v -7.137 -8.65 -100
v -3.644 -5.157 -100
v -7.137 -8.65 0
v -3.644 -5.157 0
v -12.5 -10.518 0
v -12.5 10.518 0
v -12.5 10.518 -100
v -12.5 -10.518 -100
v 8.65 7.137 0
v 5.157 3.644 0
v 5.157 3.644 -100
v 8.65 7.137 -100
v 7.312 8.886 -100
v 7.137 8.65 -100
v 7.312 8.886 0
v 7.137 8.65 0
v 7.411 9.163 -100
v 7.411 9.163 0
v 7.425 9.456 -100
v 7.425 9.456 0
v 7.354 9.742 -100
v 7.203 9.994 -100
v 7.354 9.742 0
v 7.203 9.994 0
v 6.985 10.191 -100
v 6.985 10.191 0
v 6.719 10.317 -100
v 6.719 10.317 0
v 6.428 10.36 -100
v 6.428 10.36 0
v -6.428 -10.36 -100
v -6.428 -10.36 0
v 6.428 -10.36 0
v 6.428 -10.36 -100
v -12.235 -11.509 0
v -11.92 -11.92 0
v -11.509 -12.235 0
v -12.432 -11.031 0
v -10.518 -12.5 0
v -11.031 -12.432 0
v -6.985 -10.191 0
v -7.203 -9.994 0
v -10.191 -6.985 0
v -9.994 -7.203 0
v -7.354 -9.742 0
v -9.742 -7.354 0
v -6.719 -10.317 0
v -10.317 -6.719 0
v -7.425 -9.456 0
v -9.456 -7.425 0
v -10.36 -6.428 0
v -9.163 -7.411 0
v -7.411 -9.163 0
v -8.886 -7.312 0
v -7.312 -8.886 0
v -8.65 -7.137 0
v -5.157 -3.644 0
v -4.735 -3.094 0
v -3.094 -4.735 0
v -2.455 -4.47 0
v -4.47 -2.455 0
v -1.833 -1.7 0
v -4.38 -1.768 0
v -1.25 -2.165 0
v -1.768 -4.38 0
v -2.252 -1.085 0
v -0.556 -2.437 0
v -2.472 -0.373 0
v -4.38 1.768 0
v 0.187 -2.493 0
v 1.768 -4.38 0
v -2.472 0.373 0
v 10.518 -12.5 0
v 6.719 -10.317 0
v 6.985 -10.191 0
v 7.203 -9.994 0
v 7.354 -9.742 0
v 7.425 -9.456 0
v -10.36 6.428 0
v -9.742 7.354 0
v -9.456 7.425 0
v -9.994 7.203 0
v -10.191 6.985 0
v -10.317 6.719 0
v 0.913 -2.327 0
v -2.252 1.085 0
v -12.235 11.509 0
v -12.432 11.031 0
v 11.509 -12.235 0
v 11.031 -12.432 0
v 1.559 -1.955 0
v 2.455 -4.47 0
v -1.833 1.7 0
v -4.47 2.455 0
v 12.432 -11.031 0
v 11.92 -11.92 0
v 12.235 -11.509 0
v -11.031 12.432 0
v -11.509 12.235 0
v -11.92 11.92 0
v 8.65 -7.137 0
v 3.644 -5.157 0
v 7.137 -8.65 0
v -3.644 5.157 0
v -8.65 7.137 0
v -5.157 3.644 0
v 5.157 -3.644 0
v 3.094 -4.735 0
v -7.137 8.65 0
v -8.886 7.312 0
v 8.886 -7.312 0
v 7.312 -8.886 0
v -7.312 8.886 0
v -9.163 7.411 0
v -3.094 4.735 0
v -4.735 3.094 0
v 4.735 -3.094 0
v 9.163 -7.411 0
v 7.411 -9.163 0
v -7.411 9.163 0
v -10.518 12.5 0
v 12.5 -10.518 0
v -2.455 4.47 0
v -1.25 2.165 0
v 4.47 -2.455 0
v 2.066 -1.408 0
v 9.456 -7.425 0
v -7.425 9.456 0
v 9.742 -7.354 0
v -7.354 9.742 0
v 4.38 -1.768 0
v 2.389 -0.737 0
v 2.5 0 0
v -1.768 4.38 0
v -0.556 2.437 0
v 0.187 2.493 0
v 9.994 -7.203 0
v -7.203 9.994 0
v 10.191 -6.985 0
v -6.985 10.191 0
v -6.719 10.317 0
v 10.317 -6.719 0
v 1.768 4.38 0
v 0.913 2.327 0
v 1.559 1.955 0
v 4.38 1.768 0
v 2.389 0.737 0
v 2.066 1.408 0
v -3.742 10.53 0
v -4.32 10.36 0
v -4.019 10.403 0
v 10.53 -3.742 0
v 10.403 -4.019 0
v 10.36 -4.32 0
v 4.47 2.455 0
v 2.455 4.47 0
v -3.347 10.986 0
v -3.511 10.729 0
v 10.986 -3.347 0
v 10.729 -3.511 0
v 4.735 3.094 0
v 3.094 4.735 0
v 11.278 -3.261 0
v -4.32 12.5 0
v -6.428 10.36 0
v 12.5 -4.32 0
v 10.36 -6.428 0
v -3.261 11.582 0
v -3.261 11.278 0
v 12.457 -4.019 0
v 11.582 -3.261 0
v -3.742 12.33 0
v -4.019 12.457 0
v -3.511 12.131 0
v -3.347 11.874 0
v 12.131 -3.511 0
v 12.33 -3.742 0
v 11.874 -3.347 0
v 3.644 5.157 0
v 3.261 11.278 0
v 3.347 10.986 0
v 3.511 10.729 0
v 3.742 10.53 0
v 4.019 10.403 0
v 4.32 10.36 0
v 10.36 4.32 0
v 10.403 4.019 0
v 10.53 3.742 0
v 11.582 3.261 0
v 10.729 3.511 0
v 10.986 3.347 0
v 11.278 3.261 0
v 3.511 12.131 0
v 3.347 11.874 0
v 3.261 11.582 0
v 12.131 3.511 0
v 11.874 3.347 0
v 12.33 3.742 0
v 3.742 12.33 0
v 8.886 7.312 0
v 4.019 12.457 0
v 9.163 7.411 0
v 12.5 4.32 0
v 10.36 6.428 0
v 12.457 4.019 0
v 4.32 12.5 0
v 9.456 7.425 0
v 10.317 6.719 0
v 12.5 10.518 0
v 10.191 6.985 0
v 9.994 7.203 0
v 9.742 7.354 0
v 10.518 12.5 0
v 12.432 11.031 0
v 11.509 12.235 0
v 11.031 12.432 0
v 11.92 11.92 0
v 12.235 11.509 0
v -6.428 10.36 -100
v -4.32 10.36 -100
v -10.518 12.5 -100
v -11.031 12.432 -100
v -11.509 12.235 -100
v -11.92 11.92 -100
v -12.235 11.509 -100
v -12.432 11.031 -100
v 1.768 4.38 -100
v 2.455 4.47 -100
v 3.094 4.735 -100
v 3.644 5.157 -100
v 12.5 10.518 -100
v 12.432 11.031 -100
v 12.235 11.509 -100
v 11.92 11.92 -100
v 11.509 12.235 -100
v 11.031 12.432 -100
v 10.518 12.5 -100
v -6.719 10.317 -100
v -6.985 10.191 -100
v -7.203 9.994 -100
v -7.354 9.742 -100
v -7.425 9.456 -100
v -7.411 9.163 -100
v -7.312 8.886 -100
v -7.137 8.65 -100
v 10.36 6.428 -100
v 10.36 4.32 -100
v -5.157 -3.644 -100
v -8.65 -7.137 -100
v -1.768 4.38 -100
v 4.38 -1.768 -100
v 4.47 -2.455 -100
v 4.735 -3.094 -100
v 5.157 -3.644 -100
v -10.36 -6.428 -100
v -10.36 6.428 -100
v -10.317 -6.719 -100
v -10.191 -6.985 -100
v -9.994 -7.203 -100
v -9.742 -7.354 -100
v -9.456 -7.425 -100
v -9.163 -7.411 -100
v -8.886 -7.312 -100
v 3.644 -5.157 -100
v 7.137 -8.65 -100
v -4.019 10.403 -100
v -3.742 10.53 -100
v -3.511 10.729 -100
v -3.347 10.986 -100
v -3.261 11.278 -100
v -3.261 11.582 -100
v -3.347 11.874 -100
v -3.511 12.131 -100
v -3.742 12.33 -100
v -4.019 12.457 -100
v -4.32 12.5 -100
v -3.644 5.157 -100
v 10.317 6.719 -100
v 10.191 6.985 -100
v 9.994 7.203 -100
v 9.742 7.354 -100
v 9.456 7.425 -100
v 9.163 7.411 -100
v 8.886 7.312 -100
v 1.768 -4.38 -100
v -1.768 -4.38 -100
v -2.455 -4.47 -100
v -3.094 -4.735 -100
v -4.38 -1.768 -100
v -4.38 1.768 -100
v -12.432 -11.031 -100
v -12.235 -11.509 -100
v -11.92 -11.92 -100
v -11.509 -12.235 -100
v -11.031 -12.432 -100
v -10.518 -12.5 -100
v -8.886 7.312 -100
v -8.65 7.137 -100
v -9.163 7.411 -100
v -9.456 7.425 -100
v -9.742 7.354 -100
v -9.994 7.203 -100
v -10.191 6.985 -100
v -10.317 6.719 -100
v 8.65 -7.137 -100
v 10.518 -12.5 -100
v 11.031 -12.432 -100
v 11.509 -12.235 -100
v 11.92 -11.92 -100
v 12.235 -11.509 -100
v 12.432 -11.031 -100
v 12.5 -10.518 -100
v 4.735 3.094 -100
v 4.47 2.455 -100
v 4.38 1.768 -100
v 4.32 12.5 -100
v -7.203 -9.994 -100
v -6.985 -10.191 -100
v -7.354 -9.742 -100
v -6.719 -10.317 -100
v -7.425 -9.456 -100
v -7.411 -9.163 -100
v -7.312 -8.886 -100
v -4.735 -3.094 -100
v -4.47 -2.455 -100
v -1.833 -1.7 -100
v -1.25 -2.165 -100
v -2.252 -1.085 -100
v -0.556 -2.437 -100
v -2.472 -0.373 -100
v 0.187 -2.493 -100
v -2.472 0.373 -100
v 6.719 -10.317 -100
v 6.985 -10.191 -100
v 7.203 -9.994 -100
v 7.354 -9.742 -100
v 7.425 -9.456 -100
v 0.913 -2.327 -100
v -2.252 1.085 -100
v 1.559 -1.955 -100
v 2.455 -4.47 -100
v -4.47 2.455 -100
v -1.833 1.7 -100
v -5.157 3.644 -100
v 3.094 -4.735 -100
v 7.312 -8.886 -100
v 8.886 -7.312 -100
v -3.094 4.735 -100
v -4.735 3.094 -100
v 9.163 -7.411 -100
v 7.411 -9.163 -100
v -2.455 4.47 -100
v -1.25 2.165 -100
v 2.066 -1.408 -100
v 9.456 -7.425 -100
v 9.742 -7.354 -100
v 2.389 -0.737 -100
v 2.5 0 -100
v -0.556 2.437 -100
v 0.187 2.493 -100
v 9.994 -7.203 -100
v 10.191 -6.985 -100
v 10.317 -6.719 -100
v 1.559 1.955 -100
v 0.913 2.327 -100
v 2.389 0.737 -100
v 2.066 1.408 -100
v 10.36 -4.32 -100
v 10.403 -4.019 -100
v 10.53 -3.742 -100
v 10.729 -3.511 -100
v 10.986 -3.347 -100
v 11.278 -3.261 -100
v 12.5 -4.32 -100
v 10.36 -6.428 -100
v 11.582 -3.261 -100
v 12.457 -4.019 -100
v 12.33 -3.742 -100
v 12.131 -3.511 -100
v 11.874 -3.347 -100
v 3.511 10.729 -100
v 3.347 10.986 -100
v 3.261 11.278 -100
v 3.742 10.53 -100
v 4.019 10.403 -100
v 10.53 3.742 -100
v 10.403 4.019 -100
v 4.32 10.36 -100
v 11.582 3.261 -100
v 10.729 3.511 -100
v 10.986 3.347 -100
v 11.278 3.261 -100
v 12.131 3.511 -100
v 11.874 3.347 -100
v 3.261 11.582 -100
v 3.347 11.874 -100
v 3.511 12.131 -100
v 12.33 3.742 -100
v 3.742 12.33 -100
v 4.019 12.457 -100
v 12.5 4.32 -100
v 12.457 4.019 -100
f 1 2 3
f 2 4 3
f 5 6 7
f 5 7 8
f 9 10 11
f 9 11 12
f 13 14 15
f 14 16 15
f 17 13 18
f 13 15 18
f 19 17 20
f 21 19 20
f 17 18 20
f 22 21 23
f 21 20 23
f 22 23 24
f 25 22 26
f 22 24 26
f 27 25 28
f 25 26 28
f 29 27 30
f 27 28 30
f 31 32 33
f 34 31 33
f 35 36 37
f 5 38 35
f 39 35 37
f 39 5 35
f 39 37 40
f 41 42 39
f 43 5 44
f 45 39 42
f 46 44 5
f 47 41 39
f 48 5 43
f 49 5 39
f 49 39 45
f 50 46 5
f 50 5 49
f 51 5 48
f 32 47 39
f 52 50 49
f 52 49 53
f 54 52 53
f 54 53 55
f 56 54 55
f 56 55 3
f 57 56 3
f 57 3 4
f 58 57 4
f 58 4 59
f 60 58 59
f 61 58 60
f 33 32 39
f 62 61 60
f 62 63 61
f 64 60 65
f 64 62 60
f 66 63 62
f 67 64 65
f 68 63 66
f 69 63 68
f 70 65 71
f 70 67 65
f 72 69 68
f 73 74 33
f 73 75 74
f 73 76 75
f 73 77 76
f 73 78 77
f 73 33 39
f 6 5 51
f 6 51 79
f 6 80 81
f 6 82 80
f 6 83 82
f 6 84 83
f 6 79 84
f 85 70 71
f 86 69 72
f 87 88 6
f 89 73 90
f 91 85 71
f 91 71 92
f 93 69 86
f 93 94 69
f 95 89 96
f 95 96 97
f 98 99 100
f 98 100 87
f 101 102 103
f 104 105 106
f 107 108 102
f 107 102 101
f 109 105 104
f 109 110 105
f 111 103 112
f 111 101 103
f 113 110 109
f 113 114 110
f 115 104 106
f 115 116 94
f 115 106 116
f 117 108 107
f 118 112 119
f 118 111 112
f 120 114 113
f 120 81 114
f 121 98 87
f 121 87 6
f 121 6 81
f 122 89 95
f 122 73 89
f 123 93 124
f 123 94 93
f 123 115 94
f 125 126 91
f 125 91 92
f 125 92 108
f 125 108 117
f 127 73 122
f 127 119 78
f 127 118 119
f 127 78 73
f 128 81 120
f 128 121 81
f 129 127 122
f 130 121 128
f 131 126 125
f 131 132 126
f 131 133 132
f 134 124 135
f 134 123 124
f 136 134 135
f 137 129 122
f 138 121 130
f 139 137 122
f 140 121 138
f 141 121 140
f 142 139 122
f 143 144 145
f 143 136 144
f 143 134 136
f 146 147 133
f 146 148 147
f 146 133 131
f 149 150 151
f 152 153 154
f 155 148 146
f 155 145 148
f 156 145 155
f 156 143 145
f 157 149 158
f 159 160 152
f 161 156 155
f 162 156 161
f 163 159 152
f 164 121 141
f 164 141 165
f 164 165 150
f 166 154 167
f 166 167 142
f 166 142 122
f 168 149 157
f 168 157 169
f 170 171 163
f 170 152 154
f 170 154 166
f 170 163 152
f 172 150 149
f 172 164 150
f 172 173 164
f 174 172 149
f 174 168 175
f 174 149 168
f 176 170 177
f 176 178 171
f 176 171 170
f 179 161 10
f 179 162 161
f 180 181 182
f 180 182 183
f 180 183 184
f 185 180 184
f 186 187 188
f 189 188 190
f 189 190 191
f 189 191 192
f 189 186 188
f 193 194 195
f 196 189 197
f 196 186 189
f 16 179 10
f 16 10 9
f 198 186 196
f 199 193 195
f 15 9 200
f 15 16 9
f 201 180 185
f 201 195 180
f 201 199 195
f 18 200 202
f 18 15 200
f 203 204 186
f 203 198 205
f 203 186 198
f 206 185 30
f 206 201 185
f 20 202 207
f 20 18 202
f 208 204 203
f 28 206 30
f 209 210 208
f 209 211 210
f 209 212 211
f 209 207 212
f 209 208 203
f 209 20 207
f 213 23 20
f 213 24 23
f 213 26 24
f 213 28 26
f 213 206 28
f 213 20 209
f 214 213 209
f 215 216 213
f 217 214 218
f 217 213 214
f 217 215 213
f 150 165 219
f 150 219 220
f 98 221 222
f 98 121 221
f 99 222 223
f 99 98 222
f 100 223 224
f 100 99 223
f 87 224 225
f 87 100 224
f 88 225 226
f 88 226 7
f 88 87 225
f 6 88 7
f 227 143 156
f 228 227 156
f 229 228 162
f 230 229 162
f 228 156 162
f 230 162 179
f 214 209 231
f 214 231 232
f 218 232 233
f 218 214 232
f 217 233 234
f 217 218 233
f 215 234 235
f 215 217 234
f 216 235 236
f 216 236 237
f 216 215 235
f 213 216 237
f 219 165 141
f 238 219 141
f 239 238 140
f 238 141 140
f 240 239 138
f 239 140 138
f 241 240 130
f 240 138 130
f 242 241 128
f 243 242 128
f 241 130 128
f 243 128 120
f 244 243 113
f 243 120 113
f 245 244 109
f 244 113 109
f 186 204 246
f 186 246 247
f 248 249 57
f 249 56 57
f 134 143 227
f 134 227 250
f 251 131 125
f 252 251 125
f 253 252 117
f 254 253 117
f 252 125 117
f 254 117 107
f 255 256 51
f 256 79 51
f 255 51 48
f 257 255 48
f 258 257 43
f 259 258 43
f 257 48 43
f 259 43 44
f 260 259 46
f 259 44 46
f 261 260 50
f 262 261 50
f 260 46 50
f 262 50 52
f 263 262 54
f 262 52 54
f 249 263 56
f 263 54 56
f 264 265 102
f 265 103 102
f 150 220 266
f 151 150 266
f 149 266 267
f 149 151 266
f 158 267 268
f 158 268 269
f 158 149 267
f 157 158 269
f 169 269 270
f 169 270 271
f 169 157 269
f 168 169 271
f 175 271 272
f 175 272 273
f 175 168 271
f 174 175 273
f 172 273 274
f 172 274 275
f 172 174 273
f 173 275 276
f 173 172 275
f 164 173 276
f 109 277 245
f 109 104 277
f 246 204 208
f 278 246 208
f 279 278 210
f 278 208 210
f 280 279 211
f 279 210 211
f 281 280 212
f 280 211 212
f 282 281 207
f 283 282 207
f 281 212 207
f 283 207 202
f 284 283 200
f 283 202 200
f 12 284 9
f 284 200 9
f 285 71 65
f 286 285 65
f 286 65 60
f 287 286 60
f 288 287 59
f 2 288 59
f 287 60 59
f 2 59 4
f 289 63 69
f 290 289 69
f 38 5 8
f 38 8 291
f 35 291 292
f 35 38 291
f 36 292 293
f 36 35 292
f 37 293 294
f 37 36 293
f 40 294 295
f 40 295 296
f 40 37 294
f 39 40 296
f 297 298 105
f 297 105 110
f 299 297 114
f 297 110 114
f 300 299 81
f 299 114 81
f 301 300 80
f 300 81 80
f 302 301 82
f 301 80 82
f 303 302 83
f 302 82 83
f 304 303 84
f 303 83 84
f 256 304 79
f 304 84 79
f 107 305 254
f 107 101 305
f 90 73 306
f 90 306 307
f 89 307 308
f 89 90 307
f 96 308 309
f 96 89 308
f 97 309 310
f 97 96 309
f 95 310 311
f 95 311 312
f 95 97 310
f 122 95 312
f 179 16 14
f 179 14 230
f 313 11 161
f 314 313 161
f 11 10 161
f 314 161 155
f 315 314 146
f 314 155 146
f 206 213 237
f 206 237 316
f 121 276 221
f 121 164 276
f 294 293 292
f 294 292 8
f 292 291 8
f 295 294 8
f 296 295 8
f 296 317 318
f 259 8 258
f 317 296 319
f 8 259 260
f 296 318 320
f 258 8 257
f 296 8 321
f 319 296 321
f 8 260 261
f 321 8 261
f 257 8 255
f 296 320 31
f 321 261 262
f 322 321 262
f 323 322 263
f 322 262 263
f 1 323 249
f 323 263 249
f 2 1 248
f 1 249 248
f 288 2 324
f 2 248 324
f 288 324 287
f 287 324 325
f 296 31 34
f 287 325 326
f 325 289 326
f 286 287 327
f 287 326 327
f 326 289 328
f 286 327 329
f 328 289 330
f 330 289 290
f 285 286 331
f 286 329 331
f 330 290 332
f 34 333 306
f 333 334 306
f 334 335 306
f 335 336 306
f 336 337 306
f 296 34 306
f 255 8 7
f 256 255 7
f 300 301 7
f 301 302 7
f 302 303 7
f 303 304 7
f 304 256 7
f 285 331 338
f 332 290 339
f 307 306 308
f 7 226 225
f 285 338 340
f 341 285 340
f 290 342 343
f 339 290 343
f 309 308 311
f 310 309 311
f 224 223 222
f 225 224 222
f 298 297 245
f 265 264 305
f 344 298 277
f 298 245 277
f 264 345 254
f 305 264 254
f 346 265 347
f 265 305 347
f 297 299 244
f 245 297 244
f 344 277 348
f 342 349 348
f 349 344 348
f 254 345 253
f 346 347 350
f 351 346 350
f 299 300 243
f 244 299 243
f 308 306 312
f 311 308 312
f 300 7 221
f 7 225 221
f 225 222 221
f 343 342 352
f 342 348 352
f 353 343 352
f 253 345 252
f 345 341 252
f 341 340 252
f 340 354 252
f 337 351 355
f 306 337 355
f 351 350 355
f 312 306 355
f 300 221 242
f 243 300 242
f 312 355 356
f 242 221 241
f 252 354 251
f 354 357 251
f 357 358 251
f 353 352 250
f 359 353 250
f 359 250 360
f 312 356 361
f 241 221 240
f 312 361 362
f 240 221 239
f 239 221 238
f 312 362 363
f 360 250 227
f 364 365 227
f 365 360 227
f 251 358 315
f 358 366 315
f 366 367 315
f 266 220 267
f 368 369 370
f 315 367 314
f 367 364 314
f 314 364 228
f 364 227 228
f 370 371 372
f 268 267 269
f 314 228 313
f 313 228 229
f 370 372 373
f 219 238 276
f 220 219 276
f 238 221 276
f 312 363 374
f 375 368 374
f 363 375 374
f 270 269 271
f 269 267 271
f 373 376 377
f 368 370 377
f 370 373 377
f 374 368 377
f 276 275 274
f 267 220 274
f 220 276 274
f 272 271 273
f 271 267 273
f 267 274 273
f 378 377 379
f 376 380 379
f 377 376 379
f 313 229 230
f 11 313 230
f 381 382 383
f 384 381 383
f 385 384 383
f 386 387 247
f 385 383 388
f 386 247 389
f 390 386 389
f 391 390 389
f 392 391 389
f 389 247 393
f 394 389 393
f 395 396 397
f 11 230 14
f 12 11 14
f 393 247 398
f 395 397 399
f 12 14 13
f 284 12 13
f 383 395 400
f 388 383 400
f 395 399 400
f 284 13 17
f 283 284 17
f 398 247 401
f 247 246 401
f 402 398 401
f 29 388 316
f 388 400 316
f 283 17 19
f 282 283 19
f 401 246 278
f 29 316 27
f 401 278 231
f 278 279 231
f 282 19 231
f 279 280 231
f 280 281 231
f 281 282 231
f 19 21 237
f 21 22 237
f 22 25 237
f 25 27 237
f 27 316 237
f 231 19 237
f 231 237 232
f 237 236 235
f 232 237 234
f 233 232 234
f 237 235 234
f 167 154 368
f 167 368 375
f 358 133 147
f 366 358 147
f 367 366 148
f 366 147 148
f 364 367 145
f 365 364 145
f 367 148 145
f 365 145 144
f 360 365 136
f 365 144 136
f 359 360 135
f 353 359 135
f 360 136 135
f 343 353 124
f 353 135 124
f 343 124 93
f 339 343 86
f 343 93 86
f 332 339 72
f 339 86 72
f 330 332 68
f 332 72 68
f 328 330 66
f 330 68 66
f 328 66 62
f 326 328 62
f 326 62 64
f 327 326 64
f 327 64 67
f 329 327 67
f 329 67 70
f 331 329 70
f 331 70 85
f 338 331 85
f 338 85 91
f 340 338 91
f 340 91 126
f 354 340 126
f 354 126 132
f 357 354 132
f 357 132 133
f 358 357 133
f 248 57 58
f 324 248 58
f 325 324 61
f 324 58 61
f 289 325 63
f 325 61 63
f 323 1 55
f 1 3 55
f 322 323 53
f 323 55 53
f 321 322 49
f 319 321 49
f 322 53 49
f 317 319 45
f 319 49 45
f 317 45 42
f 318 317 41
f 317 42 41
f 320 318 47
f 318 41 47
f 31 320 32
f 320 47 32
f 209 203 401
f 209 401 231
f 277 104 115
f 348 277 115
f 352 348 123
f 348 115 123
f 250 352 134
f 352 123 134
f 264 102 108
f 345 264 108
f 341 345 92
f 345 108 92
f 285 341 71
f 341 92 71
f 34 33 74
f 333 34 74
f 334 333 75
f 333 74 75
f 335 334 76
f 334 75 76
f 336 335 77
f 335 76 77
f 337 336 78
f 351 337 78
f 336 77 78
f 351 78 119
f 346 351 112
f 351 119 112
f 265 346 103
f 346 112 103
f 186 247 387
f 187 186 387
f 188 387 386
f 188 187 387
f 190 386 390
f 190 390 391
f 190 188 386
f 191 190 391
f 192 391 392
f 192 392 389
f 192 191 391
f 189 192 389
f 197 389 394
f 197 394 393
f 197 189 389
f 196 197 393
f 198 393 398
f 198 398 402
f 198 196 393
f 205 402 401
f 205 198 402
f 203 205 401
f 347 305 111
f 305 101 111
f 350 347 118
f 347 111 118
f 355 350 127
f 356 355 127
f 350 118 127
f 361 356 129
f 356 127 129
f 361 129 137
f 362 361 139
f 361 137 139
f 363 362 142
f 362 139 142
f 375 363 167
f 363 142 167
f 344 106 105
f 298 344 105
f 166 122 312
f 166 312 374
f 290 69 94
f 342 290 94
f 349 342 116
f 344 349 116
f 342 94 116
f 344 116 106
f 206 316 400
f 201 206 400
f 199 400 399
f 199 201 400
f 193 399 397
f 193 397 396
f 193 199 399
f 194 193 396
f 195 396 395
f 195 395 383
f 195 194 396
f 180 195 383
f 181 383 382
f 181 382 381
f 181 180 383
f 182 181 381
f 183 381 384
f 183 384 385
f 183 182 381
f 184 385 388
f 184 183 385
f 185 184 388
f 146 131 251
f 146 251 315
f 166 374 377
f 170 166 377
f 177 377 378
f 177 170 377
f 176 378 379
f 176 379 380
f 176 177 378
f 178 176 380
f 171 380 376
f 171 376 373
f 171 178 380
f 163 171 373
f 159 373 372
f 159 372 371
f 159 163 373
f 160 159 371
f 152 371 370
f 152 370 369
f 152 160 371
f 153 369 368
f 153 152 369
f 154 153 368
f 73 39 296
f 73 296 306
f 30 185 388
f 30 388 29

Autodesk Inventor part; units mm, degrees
ref_plane "YZ Plane" through (0, 0, 0) normal (1, 0, 0) x (0, 1, 0)
ref_plane "XZ Plane" through (0, 0, 0) normal (0, 1, 0) x (-1, 0, 0)
ref_plane "XY Plane" through (0, 0, 0) normal (0, 0, 1) x (1, 0, 0)
sketch "Sketch1" plane through (0, 0, 0) normal (0, 0, 1) x (1, 0, 0)
  arc A0 (-10.36, -6.4282) -> (-8.6498, -7.1366) centre (-9.3582, -6.4282) ccw
  line L0 (-10.36, 6.4282) -> (-10.36, -6.4282)
  arc A1 (-8.6498, 7.1366) -> (-10.36, 6.4282) centre (-9.3582, 6.4282) ccw
  line L1 (-5.1567, 3.6435) -> (-8.6498, 7.1366)
  arc A2 (-4.38, 1.7684) -> (-5.1567, 3.6435) centre (-7.0317, 1.7684) ccw
  line L2 (-4.38, -1.7684) -> (-4.38, 1.7684)
  arc A3 (-5.1567, -3.6435) -> (-4.38, -1.7684) centre (-7.0317, -1.7684) ccw
  line L3 (-8.6498, -7.1366) -> (-5.1567, -3.6435)
  arc A4 (-1.7684, -4.38) -> (-3.6435, -5.1567) centre (-1.7684, -7.0317) ccw
  line L4 (1.7684, -4.38) -> (-1.7684, -4.38)
  arc A5 (3.6435, -5.1567) -> (1.7684, -4.38) centre (1.7684, -7.0317) ccw
  line L5 (7.1366, -8.6498) -> (3.6435, -5.1567)
  arc A6 (6.4282, -10.36) -> (7.1366, -8.6498) centre (6.4282, -9.3582) ccw
  line L6 (-6.4282, -10.36) -> (6.4282, -10.36)
  arc A7 (-7.1366, -8.6498) -> (-6.4282, -10.36) centre (-6.4282, -9.3582) ccw
  line L7 (-3.6435, -5.1567) -> (-7.1366, -8.6498)
  circle A8 centre (0, 0) radius 2.5
  arc A9 (-4.32, 10.36) -> (-4.32, 12.5) centre (-4.32, 11.43) ccw
  line L8 (-4.32, 12.5) -> (-10.5183, 12.5)
  arc A10 (-10.5183, 12.5) -> (-12.5, 10.5183) centre (-10.5183, 10.5183) ccw
  line L9 (-12.5, 10.5183) -> (-12.5, -10.5183)
  arc A11 (-12.5, -10.5183) -> (-10.5183, -12.5) centre (-10.5183, -10.5183) ccw
  line L10 (-10.5183, -12.5) -> (10.5183, -12.5)
  arc A12 (10.5183, -12.5) -> (12.5, -10.5183) centre (10.5183, -10.5183) ccw
  line L11 (12.5, -10.5183) -> (12.5, -4.32)
  arc A13 (12.5, -4.32) -> (10.36, -4.32) centre (11.43, -4.32) ccw
  line L12 (10.36, -4.32) -> (10.36, -6.4282)
  arc A14 (8.6498, -7.1366) -> (10.36, -6.4282) centre (9.3582, -6.4282) ccw
  line L13 (8.6498, -7.1366) -> (5.1567, -3.6435)
  arc A15 (4.38, -1.7684) -> (5.1567, -3.6435) centre (7.0317, -1.7684) ccw
  line L14 (4.38, -1.7684) -> (4.38, 1.7684)
  arc A16 (5.1567, 3.6435) -> (4.38, 1.7684) centre (7.0317, 1.7684) ccw
  line L15 (5.1567, 3.6435) -> (8.6498, 7.1366)
  arc A17 (10.36, 6.4282) -> (8.6498, 7.1366) centre (9.3582, 6.4282) ccw
  line L16 (10.36, 6.4282) -> (10.36, 4.32)
  arc A18 (10.36, 4.32) -> (12.5, 4.32) centre (11.43, 4.32) ccw
  line L17 (12.5, 4.32) -> (12.5, 10.5183)
  arc A19 (12.5, 10.5183) -> (10.5183, 12.5) centre (10.5183, 10.5183) ccw
  line L18 (10.5183, 12.5) -> (4.32, 12.5)
  arc A20 (4.32, 12.5) -> (4.32, 10.36) centre (4.32, 11.43) ccw
  line L19 (4.32, 10.36) -> (6.4282, 10.36)
  arc A21 (7.1366, 8.6498) -> (6.4282, 10.36) centre (6.4282, 9.3582) ccw
  line L20 (7.1366, 8.6498) -> (3.6435, 5.1567)
  arc A22 (1.7684, 4.38) -> (3.6435, 5.1567) centre (1.7684, 7.0317) ccw
  line L21 (1.7684, 4.38) -> (-1.7684, 4.38)
  arc A23 (-3.6435, 5.1567) -> (-1.7684, 4.38) centre (-1.7684, 7.0317) ccw
  line L22 (-3.6435, 5.1567) -> (-7.1366, 8.6498)
  arc A24 (-6.4282, 10.36) -> (-7.1366, 8.6498) centre (-6.4282, 9.3582) ccw
  line L23 (-6.4282, 10.36) -> (-4.32, 10.36)
extrude "Extrusion1" add sketch "Sketch1" against normal blind 100
properties part number "25-2502-BLACK-FB"
